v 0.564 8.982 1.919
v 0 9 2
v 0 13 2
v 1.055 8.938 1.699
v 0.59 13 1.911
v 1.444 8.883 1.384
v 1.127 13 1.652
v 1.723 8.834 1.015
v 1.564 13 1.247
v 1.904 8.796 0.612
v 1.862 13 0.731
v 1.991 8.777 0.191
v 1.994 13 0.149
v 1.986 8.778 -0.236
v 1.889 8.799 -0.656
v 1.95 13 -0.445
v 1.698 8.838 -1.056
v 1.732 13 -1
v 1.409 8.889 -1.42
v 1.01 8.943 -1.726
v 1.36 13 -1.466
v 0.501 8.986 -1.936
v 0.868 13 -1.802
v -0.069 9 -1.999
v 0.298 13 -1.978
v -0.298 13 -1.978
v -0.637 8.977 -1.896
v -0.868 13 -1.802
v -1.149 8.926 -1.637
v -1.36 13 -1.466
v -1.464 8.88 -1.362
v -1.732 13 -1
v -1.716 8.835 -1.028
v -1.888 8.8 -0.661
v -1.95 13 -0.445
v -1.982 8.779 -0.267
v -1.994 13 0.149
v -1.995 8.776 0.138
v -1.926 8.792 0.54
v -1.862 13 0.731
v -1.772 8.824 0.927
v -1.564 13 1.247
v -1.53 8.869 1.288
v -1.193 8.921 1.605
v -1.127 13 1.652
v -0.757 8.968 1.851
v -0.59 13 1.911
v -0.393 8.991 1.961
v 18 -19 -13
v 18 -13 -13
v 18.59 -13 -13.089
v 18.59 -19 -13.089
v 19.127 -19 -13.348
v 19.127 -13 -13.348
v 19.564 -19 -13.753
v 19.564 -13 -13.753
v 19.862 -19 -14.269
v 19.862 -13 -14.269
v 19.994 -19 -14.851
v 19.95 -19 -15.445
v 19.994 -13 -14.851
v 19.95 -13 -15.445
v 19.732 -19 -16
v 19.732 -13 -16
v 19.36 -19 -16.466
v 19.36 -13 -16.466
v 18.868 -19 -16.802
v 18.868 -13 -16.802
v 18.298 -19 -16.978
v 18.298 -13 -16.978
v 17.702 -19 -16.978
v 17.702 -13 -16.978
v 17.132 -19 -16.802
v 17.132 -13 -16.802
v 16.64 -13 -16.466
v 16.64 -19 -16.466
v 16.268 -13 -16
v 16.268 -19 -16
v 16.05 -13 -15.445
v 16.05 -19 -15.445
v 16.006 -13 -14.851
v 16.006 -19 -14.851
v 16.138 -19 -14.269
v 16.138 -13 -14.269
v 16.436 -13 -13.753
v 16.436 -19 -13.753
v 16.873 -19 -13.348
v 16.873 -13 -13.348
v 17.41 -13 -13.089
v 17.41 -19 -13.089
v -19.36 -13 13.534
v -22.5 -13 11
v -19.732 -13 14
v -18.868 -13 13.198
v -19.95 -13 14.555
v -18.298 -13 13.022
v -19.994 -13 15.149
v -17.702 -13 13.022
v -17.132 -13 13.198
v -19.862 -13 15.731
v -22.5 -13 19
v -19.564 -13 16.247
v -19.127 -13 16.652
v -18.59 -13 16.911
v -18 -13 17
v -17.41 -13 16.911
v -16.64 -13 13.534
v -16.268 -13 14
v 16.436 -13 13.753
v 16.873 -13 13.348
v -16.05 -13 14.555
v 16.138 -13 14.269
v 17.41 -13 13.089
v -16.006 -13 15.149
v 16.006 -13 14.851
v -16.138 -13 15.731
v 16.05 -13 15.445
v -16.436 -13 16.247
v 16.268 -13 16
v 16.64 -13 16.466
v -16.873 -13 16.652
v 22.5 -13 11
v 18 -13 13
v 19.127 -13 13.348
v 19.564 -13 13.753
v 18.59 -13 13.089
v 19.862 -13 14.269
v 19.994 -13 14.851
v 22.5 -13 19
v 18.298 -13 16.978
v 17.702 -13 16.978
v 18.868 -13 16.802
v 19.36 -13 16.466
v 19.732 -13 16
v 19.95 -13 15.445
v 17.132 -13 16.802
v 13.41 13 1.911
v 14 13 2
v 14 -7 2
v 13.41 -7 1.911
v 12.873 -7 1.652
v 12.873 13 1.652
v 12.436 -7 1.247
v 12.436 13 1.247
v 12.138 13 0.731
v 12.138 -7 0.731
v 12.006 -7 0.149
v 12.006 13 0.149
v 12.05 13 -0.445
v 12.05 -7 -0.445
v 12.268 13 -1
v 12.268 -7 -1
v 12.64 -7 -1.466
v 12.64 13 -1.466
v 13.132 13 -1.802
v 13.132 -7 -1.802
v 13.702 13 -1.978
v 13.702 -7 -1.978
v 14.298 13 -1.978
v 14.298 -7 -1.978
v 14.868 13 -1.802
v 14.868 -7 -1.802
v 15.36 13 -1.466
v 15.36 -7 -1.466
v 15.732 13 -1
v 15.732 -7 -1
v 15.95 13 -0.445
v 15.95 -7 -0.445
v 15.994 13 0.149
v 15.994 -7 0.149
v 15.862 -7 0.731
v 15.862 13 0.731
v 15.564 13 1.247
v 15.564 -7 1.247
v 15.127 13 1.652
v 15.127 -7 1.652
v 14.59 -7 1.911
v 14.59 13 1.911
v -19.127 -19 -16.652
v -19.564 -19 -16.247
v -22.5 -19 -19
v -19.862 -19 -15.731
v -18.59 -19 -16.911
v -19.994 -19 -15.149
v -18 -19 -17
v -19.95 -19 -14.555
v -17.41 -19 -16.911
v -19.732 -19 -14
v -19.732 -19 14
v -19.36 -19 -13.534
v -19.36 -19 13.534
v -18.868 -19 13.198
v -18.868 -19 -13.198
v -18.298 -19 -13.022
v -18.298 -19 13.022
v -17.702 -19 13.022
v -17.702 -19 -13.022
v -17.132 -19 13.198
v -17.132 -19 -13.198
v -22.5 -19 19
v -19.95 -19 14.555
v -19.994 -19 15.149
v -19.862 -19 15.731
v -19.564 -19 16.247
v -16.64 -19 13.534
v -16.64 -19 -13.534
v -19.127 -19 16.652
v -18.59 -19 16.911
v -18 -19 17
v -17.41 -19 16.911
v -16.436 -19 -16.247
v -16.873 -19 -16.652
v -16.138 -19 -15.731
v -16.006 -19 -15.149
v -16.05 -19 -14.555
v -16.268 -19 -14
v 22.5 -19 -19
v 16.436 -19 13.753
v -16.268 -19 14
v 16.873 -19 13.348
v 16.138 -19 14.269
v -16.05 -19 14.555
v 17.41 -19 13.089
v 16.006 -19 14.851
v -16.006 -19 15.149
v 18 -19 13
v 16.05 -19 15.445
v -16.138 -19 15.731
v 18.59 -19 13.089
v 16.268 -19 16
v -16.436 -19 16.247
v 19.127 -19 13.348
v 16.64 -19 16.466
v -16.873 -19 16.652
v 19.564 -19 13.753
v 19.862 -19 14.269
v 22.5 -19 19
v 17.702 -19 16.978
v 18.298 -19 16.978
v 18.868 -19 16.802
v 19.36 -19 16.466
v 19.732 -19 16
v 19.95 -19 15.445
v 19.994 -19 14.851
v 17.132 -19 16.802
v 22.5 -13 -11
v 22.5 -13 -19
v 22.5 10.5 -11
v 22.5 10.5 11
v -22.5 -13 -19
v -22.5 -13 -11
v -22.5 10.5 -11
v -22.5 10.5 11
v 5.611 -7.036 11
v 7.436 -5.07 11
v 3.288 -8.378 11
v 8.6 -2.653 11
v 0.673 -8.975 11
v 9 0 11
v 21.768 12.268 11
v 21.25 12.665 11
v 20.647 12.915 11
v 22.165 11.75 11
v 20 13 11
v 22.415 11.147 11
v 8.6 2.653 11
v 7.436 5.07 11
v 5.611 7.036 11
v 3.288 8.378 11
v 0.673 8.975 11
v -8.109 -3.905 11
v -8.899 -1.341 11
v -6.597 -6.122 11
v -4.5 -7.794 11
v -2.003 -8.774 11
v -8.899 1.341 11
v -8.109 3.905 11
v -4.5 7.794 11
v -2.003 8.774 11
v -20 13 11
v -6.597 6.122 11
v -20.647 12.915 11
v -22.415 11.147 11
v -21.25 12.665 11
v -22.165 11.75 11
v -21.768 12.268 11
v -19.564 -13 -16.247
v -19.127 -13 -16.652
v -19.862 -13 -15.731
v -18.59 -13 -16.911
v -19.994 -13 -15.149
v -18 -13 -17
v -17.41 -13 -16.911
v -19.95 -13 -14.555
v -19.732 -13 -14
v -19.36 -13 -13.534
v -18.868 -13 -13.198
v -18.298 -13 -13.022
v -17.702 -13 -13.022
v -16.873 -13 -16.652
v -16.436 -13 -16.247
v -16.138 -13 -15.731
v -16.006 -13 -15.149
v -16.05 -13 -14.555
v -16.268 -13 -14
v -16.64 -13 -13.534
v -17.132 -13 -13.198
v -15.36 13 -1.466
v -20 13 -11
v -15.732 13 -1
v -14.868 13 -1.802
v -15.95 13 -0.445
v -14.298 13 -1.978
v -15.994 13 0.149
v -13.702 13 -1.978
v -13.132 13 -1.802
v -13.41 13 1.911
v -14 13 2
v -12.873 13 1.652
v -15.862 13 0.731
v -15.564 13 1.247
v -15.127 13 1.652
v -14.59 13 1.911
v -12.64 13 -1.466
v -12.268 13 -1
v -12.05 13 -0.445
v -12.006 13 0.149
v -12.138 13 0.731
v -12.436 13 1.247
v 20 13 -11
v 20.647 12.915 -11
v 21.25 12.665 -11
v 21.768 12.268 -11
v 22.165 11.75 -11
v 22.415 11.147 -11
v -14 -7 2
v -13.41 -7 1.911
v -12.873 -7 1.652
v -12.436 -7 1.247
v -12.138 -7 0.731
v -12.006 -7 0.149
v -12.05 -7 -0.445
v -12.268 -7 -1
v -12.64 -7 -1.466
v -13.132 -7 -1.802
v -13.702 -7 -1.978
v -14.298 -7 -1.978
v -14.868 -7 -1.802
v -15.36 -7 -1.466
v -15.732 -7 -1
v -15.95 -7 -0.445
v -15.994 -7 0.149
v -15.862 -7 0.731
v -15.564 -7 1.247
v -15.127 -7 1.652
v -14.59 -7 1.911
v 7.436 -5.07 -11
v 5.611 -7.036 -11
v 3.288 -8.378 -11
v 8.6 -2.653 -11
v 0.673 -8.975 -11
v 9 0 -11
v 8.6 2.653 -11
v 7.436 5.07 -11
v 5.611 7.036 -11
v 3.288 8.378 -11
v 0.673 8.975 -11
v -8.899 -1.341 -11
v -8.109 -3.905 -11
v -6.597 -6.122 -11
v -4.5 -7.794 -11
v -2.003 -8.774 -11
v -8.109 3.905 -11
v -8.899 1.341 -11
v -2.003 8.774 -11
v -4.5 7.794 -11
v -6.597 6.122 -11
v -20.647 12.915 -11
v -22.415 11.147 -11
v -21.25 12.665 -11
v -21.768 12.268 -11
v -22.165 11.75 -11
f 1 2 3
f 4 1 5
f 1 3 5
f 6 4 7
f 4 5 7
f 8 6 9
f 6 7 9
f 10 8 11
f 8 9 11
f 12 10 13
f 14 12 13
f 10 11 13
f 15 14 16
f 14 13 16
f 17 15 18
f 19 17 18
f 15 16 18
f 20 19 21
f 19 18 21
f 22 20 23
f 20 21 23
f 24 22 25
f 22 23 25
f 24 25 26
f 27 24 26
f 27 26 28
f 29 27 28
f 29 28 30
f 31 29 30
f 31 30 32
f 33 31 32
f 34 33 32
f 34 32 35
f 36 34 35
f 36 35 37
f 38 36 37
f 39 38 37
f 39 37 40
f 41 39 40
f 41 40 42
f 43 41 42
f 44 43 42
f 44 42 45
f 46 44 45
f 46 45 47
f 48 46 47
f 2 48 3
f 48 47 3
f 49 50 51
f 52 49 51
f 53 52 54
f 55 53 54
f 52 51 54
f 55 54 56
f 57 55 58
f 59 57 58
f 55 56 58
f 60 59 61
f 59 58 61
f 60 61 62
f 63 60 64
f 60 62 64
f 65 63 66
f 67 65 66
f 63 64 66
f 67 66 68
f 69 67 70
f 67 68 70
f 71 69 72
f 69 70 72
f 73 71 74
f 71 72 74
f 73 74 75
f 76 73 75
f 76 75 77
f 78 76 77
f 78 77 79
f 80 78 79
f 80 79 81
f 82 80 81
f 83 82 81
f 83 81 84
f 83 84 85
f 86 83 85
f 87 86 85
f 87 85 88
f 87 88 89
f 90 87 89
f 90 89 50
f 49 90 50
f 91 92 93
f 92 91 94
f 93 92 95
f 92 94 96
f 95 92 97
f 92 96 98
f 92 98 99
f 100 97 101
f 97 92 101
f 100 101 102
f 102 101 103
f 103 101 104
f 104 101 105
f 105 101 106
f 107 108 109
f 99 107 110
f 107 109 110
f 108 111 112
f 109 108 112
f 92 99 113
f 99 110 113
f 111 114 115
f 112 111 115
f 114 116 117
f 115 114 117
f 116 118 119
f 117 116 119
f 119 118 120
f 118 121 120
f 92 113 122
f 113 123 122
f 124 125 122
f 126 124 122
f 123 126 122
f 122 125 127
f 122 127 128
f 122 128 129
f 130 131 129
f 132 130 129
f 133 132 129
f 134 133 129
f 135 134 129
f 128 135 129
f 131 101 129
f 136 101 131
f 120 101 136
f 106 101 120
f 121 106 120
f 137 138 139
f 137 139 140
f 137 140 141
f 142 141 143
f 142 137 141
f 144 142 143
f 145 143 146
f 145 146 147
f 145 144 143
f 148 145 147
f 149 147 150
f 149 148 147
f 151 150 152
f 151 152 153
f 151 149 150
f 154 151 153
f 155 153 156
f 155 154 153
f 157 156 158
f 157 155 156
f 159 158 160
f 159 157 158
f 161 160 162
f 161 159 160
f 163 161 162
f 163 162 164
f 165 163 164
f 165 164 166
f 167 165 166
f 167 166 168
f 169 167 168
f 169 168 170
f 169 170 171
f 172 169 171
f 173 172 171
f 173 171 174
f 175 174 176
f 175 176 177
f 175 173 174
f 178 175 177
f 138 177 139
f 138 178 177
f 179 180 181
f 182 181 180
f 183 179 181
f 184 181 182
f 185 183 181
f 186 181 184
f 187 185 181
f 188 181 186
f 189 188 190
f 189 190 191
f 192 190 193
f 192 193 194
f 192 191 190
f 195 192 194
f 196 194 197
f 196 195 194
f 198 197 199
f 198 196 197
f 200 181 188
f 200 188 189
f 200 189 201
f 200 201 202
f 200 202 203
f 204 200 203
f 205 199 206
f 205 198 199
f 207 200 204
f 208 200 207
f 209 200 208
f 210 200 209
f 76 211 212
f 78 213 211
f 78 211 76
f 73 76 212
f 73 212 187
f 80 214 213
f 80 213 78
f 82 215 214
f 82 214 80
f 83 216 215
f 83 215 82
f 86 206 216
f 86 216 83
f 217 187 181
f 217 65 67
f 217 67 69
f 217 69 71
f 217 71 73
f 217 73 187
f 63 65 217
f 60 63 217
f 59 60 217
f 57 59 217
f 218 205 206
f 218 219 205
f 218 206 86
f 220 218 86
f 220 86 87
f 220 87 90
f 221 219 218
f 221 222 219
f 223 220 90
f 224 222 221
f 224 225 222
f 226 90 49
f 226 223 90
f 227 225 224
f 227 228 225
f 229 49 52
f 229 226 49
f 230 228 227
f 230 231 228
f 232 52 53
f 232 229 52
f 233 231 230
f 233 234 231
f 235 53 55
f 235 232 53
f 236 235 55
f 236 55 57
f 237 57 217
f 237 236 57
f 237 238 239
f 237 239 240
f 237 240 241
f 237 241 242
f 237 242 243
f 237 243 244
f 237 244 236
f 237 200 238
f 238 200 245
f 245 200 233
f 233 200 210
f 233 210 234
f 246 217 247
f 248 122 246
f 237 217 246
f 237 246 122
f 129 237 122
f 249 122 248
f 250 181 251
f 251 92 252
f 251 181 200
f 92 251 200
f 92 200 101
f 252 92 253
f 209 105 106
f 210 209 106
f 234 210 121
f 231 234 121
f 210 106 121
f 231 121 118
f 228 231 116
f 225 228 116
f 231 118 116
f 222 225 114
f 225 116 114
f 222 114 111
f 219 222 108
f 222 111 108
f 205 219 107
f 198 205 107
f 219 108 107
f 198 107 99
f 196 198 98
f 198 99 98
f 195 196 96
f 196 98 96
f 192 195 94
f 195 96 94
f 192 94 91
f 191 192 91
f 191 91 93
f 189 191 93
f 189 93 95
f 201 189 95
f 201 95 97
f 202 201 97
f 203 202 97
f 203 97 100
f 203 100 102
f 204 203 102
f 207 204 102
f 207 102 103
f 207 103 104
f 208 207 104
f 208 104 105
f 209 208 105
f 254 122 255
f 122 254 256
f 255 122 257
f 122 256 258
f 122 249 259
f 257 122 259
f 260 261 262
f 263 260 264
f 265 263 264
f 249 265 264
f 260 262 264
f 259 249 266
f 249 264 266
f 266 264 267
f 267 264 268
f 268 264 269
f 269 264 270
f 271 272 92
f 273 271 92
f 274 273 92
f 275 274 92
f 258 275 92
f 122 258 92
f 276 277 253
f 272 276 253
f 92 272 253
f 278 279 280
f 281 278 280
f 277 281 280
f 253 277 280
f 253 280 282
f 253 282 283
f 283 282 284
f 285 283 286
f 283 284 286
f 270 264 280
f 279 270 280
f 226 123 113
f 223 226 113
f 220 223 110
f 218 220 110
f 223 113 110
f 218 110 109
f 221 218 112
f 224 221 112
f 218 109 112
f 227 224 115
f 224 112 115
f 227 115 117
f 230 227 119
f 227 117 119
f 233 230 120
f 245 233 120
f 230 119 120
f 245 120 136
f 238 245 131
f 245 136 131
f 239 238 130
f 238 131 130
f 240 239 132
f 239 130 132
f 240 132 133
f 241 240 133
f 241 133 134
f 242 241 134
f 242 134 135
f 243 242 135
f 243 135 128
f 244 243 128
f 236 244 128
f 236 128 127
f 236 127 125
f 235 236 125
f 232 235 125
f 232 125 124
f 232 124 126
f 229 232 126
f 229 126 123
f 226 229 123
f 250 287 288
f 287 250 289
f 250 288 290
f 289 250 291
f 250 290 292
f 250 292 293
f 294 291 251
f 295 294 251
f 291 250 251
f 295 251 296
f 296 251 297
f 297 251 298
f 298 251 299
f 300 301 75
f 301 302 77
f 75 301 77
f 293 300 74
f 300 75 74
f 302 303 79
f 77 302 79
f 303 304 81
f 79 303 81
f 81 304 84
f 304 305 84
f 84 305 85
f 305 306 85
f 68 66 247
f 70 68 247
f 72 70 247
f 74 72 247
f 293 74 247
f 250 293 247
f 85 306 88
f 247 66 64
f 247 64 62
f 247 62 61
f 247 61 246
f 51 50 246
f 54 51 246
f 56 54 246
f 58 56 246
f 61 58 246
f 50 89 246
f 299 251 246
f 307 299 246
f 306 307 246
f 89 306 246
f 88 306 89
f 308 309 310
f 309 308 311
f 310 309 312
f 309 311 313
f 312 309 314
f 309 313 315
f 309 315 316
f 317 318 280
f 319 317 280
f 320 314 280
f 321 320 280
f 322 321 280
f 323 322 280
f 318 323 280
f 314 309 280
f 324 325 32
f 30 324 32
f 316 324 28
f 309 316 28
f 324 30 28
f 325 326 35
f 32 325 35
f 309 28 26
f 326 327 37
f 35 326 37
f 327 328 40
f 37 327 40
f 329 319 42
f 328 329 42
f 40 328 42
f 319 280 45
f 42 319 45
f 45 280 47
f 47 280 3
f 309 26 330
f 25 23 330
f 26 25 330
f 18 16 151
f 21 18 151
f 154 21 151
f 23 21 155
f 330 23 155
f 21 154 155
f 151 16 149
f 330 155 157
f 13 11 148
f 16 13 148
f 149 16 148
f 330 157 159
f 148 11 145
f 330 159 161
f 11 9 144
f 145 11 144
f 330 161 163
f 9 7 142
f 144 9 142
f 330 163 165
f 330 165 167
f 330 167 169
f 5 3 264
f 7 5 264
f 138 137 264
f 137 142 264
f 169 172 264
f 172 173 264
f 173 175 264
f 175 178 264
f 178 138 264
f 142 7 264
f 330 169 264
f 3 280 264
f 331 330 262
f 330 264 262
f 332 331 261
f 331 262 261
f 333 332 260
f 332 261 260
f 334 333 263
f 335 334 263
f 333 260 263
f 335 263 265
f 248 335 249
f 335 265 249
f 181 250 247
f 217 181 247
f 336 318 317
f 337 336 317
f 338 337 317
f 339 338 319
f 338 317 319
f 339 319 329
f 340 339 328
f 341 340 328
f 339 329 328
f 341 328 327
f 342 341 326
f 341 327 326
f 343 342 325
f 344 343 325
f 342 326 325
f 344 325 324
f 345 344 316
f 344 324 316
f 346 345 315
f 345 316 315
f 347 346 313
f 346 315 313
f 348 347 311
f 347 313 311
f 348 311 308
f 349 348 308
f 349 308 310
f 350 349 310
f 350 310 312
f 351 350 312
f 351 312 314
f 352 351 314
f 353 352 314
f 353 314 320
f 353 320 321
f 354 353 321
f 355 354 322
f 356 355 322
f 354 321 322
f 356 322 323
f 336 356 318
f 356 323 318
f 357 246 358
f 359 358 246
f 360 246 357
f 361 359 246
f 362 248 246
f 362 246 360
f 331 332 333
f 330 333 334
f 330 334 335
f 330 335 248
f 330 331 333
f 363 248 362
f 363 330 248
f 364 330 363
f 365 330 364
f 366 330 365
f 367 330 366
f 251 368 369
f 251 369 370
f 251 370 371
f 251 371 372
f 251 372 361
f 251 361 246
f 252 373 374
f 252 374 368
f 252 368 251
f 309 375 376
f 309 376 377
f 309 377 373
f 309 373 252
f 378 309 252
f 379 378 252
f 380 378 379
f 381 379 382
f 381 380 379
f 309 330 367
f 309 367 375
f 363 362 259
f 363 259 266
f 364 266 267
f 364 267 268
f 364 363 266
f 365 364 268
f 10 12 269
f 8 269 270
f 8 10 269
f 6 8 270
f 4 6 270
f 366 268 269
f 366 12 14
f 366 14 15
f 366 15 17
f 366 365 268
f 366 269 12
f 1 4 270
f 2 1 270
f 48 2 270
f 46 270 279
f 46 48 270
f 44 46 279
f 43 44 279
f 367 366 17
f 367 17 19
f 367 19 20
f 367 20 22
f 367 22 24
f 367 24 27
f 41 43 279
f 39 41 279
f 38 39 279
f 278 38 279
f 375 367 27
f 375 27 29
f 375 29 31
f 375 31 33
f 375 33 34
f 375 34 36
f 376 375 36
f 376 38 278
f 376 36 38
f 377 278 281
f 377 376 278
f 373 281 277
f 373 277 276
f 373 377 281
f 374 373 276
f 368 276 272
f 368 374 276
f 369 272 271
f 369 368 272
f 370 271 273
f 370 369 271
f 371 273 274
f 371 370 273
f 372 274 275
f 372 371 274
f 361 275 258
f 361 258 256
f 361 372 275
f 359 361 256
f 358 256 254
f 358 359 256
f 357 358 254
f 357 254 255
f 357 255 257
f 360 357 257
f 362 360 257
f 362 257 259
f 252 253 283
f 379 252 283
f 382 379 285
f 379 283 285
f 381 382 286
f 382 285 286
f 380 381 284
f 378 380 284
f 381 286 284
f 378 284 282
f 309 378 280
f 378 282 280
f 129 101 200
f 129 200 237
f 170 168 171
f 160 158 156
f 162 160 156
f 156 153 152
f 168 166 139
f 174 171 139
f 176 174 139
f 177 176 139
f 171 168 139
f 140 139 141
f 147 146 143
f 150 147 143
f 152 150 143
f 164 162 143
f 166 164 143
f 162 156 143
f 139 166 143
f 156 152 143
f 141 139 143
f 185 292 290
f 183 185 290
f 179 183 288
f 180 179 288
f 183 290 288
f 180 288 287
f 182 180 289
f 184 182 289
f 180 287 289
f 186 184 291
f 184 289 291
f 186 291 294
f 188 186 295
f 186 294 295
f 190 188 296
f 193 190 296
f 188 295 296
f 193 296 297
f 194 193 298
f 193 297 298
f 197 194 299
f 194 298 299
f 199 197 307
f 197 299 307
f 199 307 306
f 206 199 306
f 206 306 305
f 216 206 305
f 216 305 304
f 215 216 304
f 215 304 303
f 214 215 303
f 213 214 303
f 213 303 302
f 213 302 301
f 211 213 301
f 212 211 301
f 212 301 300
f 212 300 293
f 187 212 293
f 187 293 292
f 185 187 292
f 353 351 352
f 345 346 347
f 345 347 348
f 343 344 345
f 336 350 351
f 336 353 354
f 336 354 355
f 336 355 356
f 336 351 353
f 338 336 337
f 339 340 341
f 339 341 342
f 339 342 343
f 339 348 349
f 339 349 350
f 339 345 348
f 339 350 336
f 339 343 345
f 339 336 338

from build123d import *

# Parameters (mm, degrees)
SKETCH1_R               = 9
BOSS_EXTRUDE1_DEPTH     = 11
SKETCH1_3_W             = 45
SKETCH1_3_H             = 6
BOSS_EXTRUDE2_DEPTH     = 19
SKETCH2_R               = 2
CUT_EXTRUDE1_DEPTH      = 40.284220751
CUT_EXTRUDE2_REACH      = 45.489
CUT_EXTRUDE2_END_RADIUS = 9
SKETCH3_R               = 2
SKETCH3_3_R             = 2
CUT_EXTRUDE3_DEPTH      = 20


with BuildPart() as part:
    # Sketch1 → Boss-Extrude1 (new, symmetric)
    with BuildSketch(Plane.XY):
        with BuildLine():
            Line((-20, 13), (20, 13))
            ThreePointArc((20, 13), (21.767766953, 12.267766953), (22.5, 10.5))
            Line((22.5, 10.5), (22.5, -13))
            Line((22.5, -13), (-22.5, -13))
            Line((-22.5, -13), (-22.5, 10.5))
            ThreePointArc((-22.5, 10.5), (-21.767766953, 12.267766953), (-20, 13))
        make_face()
        Circle(SKETCH1_R, mode=Mode.SUBTRACT)
    extrude(amount=BOSS_EXTRUDE1_DEPTH, both=True)

    # Sketch1<3> → Boss-Extrude2 (add, symmetric)
    with BuildSketch(Plane.XY):
        with Locations((0, -16)):
            Rectangle(SKETCH1_3_W, SKETCH1_3_H)
    extrude(amount=BOSS_EXTRUDE2_DEPTH, both=True)

    # Sketch2 → Cut-Extrude1 (cut, through all)
    with BuildSketch(Plane(origin=(0, -13, 0), x_dir=(1, 0, 0), z_dir=(0, 1, 0))):
        with Locations(Location((-18, -15, 0), (0, 0, 270))):
            Circle(SKETCH2_R)
        with Locations(Location((18, -15, 0), (0, 0, 90))):
            Circle(SKETCH2_R)
        with Locations(Location((18, 15, 0), (0, 0, 270))):
            Circle(SKETCH2_R)
        with Locations(Location((-18, 15, 0), (0, 0, 90))):
            Circle(SKETCH2_R)
    extrude(amount=-CUT_EXTRUDE1_DEPTH, mode=Mode.SUBTRACT)

    # Cut-Extrude2: up to this cylinder (the profile starts outside it)
    cut_extrude2_end = Plane(origin=(0, 0, 0), z_dir=(0, 0, -1)) * Cylinder(CUT_EXTRUDE2_END_RADIUS, 109.978, mode=Mode.PRIVATE)
    # Sketch3 → Cut-Extrude2 (cut, up to the surface)
    with BuildSketch(Plane(origin=(0, 13, 0), x_dir=(1, 0, 0), z_dir=(0, 1, 0)), mode=Mode.PRIVATE) as cut_extrude2_sk1:
        with Locations(Location((0, 0, 0), (0, 0, 270))):
            Circle(SKETCH3_R)
    cut_extrude2_tool1 = extrude(cut_extrude2_sk1.sketch, amount=-CUT_EXTRUDE2_REACH, mode=Mode.PRIVATE) - cut_extrude2_end
    add(cut_extrude2_tool1.solids().sort_by_distance((0, 13, 0))[0], mode=Mode.SUBTRACT)

    # Sketch3<3> → Cut-Extrude3 (cut)
    with BuildSketch(Plane(origin=(0, 13, 0), x_dir=(1, 0, 0), z_dir=(0, 1, 0))):
        with Locations(Location((-14, 0, 0), (0, 0, 270))):
            Circle(SKETCH3_3_R)
    cut_extrude3 = extrude(amount=-CUT_EXTRUDE3_DEPTH, mode=Mode.SUBTRACT)

    # Mirror1: Cut-Extrude3 across plane
    add(cut_extrude3.mirror(Plane(origin=(0, 0, 0), x_dir=(0, 0, 1), z_dir=(1, 0, 0))), mode=Mode.SUBTRACT)


solid = part.part
